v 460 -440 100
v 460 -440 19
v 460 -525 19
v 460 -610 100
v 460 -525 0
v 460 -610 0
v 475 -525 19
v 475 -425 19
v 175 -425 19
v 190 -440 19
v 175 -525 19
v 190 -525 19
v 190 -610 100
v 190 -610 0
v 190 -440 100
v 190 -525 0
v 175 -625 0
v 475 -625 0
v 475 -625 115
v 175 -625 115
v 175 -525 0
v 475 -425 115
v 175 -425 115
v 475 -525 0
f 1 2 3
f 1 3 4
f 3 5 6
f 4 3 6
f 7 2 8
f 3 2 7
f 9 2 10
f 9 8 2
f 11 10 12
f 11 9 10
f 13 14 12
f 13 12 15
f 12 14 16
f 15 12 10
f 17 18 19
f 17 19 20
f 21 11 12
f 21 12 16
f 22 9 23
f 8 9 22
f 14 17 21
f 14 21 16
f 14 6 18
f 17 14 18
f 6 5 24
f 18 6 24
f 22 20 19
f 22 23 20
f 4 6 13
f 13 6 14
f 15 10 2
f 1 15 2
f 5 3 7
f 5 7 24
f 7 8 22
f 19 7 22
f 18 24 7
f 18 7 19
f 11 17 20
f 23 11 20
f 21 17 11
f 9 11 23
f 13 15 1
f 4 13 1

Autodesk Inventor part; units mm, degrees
ref_plane "YZ Plane" through (0, 0, 0) normal (1, 0, 0) x (0, 1, 0)
ref_plane "XZ Plane" through (0, 0, 0) normal (0, 1, 0) x (-1, 0, 0)
ref_plane "XY Plane" through (0, 0, 0) normal (0, 0, 1) x (1, 0, 0)
ref_plane "Work Plane1" through (0, 0, 0) normal (0, 0, 1) x (1, 0, 0)
sketch "Sketch1" plane through (0, 0, 0) normal (0, 0, 1) x (1, 0, 0)
  line L0 (475, -625) -> (475, -525) construction
  line L1 (427.5, -425) -> (532.5, -425) construction
  line L2 (175, -525) -> (175, -625) construction
  line L3 (475, -625) -> (175, -625)
  line L4 (175, -625) -> (175, -425)
  line L5 (175, -425) -> (475, -425)
  line L6 (475, -425) -> (475, -625)
  line L7 (460, -610) -> (190, -610)
  line L8 (190, -610) -> (190, -440)
  line L9 (190, -440) -> (460, -440)
  line L10 (460, -440) -> (460, -610)
  line L11 (325, -625) -> (325, -610) construction
  line L12 (475, -525) -> (460, -525) construction
  line L13 (190, -525) -> (175, -525) construction
  line L14 (325, -440) -> (325, -425) construction
  point P0 (0, 0)
  dimension "d0" = 15
extrude "Extrusion1" add sketch "Sketch1" along normal blind 100
sketch "Sketch2" plane through (0, 0, 100) normal (0, 0, 1) x (1, 0, 0)
  line L0 (175, -425) -> (475, -425)
  line L1 (475, -425) -> (475, -625)
  line L2 (475, -625) -> (175, -625)
  line L3 (175, -625) -> (175, -425)
  point P0 (0, 0)
extrude "Extrusion2" add sketch "Sketch2" along normal blind 15
sketch "Sketch3" plane through (175, -625, 0) normal (-1, 0, 0) x (0, 0, 1)
  line L0 (19, 1250) -> (19, 100) construction
  line L1 (0, 100) -> (-19, 100) construction
  line L2 (0, 200) -> (19, 200)
  line L3 (19, 200) -> (19, 100)
  line L4 (19, 100) -> (0, 100)
  line L5 (0, 100) -> (0, 200)
  point P0 (0, 625)
extrude "Extrusion3" cut sketch "Sketch3" against normal up to next
properties part number "Control_Box" material "MDF Medium Density Fiberboard"
